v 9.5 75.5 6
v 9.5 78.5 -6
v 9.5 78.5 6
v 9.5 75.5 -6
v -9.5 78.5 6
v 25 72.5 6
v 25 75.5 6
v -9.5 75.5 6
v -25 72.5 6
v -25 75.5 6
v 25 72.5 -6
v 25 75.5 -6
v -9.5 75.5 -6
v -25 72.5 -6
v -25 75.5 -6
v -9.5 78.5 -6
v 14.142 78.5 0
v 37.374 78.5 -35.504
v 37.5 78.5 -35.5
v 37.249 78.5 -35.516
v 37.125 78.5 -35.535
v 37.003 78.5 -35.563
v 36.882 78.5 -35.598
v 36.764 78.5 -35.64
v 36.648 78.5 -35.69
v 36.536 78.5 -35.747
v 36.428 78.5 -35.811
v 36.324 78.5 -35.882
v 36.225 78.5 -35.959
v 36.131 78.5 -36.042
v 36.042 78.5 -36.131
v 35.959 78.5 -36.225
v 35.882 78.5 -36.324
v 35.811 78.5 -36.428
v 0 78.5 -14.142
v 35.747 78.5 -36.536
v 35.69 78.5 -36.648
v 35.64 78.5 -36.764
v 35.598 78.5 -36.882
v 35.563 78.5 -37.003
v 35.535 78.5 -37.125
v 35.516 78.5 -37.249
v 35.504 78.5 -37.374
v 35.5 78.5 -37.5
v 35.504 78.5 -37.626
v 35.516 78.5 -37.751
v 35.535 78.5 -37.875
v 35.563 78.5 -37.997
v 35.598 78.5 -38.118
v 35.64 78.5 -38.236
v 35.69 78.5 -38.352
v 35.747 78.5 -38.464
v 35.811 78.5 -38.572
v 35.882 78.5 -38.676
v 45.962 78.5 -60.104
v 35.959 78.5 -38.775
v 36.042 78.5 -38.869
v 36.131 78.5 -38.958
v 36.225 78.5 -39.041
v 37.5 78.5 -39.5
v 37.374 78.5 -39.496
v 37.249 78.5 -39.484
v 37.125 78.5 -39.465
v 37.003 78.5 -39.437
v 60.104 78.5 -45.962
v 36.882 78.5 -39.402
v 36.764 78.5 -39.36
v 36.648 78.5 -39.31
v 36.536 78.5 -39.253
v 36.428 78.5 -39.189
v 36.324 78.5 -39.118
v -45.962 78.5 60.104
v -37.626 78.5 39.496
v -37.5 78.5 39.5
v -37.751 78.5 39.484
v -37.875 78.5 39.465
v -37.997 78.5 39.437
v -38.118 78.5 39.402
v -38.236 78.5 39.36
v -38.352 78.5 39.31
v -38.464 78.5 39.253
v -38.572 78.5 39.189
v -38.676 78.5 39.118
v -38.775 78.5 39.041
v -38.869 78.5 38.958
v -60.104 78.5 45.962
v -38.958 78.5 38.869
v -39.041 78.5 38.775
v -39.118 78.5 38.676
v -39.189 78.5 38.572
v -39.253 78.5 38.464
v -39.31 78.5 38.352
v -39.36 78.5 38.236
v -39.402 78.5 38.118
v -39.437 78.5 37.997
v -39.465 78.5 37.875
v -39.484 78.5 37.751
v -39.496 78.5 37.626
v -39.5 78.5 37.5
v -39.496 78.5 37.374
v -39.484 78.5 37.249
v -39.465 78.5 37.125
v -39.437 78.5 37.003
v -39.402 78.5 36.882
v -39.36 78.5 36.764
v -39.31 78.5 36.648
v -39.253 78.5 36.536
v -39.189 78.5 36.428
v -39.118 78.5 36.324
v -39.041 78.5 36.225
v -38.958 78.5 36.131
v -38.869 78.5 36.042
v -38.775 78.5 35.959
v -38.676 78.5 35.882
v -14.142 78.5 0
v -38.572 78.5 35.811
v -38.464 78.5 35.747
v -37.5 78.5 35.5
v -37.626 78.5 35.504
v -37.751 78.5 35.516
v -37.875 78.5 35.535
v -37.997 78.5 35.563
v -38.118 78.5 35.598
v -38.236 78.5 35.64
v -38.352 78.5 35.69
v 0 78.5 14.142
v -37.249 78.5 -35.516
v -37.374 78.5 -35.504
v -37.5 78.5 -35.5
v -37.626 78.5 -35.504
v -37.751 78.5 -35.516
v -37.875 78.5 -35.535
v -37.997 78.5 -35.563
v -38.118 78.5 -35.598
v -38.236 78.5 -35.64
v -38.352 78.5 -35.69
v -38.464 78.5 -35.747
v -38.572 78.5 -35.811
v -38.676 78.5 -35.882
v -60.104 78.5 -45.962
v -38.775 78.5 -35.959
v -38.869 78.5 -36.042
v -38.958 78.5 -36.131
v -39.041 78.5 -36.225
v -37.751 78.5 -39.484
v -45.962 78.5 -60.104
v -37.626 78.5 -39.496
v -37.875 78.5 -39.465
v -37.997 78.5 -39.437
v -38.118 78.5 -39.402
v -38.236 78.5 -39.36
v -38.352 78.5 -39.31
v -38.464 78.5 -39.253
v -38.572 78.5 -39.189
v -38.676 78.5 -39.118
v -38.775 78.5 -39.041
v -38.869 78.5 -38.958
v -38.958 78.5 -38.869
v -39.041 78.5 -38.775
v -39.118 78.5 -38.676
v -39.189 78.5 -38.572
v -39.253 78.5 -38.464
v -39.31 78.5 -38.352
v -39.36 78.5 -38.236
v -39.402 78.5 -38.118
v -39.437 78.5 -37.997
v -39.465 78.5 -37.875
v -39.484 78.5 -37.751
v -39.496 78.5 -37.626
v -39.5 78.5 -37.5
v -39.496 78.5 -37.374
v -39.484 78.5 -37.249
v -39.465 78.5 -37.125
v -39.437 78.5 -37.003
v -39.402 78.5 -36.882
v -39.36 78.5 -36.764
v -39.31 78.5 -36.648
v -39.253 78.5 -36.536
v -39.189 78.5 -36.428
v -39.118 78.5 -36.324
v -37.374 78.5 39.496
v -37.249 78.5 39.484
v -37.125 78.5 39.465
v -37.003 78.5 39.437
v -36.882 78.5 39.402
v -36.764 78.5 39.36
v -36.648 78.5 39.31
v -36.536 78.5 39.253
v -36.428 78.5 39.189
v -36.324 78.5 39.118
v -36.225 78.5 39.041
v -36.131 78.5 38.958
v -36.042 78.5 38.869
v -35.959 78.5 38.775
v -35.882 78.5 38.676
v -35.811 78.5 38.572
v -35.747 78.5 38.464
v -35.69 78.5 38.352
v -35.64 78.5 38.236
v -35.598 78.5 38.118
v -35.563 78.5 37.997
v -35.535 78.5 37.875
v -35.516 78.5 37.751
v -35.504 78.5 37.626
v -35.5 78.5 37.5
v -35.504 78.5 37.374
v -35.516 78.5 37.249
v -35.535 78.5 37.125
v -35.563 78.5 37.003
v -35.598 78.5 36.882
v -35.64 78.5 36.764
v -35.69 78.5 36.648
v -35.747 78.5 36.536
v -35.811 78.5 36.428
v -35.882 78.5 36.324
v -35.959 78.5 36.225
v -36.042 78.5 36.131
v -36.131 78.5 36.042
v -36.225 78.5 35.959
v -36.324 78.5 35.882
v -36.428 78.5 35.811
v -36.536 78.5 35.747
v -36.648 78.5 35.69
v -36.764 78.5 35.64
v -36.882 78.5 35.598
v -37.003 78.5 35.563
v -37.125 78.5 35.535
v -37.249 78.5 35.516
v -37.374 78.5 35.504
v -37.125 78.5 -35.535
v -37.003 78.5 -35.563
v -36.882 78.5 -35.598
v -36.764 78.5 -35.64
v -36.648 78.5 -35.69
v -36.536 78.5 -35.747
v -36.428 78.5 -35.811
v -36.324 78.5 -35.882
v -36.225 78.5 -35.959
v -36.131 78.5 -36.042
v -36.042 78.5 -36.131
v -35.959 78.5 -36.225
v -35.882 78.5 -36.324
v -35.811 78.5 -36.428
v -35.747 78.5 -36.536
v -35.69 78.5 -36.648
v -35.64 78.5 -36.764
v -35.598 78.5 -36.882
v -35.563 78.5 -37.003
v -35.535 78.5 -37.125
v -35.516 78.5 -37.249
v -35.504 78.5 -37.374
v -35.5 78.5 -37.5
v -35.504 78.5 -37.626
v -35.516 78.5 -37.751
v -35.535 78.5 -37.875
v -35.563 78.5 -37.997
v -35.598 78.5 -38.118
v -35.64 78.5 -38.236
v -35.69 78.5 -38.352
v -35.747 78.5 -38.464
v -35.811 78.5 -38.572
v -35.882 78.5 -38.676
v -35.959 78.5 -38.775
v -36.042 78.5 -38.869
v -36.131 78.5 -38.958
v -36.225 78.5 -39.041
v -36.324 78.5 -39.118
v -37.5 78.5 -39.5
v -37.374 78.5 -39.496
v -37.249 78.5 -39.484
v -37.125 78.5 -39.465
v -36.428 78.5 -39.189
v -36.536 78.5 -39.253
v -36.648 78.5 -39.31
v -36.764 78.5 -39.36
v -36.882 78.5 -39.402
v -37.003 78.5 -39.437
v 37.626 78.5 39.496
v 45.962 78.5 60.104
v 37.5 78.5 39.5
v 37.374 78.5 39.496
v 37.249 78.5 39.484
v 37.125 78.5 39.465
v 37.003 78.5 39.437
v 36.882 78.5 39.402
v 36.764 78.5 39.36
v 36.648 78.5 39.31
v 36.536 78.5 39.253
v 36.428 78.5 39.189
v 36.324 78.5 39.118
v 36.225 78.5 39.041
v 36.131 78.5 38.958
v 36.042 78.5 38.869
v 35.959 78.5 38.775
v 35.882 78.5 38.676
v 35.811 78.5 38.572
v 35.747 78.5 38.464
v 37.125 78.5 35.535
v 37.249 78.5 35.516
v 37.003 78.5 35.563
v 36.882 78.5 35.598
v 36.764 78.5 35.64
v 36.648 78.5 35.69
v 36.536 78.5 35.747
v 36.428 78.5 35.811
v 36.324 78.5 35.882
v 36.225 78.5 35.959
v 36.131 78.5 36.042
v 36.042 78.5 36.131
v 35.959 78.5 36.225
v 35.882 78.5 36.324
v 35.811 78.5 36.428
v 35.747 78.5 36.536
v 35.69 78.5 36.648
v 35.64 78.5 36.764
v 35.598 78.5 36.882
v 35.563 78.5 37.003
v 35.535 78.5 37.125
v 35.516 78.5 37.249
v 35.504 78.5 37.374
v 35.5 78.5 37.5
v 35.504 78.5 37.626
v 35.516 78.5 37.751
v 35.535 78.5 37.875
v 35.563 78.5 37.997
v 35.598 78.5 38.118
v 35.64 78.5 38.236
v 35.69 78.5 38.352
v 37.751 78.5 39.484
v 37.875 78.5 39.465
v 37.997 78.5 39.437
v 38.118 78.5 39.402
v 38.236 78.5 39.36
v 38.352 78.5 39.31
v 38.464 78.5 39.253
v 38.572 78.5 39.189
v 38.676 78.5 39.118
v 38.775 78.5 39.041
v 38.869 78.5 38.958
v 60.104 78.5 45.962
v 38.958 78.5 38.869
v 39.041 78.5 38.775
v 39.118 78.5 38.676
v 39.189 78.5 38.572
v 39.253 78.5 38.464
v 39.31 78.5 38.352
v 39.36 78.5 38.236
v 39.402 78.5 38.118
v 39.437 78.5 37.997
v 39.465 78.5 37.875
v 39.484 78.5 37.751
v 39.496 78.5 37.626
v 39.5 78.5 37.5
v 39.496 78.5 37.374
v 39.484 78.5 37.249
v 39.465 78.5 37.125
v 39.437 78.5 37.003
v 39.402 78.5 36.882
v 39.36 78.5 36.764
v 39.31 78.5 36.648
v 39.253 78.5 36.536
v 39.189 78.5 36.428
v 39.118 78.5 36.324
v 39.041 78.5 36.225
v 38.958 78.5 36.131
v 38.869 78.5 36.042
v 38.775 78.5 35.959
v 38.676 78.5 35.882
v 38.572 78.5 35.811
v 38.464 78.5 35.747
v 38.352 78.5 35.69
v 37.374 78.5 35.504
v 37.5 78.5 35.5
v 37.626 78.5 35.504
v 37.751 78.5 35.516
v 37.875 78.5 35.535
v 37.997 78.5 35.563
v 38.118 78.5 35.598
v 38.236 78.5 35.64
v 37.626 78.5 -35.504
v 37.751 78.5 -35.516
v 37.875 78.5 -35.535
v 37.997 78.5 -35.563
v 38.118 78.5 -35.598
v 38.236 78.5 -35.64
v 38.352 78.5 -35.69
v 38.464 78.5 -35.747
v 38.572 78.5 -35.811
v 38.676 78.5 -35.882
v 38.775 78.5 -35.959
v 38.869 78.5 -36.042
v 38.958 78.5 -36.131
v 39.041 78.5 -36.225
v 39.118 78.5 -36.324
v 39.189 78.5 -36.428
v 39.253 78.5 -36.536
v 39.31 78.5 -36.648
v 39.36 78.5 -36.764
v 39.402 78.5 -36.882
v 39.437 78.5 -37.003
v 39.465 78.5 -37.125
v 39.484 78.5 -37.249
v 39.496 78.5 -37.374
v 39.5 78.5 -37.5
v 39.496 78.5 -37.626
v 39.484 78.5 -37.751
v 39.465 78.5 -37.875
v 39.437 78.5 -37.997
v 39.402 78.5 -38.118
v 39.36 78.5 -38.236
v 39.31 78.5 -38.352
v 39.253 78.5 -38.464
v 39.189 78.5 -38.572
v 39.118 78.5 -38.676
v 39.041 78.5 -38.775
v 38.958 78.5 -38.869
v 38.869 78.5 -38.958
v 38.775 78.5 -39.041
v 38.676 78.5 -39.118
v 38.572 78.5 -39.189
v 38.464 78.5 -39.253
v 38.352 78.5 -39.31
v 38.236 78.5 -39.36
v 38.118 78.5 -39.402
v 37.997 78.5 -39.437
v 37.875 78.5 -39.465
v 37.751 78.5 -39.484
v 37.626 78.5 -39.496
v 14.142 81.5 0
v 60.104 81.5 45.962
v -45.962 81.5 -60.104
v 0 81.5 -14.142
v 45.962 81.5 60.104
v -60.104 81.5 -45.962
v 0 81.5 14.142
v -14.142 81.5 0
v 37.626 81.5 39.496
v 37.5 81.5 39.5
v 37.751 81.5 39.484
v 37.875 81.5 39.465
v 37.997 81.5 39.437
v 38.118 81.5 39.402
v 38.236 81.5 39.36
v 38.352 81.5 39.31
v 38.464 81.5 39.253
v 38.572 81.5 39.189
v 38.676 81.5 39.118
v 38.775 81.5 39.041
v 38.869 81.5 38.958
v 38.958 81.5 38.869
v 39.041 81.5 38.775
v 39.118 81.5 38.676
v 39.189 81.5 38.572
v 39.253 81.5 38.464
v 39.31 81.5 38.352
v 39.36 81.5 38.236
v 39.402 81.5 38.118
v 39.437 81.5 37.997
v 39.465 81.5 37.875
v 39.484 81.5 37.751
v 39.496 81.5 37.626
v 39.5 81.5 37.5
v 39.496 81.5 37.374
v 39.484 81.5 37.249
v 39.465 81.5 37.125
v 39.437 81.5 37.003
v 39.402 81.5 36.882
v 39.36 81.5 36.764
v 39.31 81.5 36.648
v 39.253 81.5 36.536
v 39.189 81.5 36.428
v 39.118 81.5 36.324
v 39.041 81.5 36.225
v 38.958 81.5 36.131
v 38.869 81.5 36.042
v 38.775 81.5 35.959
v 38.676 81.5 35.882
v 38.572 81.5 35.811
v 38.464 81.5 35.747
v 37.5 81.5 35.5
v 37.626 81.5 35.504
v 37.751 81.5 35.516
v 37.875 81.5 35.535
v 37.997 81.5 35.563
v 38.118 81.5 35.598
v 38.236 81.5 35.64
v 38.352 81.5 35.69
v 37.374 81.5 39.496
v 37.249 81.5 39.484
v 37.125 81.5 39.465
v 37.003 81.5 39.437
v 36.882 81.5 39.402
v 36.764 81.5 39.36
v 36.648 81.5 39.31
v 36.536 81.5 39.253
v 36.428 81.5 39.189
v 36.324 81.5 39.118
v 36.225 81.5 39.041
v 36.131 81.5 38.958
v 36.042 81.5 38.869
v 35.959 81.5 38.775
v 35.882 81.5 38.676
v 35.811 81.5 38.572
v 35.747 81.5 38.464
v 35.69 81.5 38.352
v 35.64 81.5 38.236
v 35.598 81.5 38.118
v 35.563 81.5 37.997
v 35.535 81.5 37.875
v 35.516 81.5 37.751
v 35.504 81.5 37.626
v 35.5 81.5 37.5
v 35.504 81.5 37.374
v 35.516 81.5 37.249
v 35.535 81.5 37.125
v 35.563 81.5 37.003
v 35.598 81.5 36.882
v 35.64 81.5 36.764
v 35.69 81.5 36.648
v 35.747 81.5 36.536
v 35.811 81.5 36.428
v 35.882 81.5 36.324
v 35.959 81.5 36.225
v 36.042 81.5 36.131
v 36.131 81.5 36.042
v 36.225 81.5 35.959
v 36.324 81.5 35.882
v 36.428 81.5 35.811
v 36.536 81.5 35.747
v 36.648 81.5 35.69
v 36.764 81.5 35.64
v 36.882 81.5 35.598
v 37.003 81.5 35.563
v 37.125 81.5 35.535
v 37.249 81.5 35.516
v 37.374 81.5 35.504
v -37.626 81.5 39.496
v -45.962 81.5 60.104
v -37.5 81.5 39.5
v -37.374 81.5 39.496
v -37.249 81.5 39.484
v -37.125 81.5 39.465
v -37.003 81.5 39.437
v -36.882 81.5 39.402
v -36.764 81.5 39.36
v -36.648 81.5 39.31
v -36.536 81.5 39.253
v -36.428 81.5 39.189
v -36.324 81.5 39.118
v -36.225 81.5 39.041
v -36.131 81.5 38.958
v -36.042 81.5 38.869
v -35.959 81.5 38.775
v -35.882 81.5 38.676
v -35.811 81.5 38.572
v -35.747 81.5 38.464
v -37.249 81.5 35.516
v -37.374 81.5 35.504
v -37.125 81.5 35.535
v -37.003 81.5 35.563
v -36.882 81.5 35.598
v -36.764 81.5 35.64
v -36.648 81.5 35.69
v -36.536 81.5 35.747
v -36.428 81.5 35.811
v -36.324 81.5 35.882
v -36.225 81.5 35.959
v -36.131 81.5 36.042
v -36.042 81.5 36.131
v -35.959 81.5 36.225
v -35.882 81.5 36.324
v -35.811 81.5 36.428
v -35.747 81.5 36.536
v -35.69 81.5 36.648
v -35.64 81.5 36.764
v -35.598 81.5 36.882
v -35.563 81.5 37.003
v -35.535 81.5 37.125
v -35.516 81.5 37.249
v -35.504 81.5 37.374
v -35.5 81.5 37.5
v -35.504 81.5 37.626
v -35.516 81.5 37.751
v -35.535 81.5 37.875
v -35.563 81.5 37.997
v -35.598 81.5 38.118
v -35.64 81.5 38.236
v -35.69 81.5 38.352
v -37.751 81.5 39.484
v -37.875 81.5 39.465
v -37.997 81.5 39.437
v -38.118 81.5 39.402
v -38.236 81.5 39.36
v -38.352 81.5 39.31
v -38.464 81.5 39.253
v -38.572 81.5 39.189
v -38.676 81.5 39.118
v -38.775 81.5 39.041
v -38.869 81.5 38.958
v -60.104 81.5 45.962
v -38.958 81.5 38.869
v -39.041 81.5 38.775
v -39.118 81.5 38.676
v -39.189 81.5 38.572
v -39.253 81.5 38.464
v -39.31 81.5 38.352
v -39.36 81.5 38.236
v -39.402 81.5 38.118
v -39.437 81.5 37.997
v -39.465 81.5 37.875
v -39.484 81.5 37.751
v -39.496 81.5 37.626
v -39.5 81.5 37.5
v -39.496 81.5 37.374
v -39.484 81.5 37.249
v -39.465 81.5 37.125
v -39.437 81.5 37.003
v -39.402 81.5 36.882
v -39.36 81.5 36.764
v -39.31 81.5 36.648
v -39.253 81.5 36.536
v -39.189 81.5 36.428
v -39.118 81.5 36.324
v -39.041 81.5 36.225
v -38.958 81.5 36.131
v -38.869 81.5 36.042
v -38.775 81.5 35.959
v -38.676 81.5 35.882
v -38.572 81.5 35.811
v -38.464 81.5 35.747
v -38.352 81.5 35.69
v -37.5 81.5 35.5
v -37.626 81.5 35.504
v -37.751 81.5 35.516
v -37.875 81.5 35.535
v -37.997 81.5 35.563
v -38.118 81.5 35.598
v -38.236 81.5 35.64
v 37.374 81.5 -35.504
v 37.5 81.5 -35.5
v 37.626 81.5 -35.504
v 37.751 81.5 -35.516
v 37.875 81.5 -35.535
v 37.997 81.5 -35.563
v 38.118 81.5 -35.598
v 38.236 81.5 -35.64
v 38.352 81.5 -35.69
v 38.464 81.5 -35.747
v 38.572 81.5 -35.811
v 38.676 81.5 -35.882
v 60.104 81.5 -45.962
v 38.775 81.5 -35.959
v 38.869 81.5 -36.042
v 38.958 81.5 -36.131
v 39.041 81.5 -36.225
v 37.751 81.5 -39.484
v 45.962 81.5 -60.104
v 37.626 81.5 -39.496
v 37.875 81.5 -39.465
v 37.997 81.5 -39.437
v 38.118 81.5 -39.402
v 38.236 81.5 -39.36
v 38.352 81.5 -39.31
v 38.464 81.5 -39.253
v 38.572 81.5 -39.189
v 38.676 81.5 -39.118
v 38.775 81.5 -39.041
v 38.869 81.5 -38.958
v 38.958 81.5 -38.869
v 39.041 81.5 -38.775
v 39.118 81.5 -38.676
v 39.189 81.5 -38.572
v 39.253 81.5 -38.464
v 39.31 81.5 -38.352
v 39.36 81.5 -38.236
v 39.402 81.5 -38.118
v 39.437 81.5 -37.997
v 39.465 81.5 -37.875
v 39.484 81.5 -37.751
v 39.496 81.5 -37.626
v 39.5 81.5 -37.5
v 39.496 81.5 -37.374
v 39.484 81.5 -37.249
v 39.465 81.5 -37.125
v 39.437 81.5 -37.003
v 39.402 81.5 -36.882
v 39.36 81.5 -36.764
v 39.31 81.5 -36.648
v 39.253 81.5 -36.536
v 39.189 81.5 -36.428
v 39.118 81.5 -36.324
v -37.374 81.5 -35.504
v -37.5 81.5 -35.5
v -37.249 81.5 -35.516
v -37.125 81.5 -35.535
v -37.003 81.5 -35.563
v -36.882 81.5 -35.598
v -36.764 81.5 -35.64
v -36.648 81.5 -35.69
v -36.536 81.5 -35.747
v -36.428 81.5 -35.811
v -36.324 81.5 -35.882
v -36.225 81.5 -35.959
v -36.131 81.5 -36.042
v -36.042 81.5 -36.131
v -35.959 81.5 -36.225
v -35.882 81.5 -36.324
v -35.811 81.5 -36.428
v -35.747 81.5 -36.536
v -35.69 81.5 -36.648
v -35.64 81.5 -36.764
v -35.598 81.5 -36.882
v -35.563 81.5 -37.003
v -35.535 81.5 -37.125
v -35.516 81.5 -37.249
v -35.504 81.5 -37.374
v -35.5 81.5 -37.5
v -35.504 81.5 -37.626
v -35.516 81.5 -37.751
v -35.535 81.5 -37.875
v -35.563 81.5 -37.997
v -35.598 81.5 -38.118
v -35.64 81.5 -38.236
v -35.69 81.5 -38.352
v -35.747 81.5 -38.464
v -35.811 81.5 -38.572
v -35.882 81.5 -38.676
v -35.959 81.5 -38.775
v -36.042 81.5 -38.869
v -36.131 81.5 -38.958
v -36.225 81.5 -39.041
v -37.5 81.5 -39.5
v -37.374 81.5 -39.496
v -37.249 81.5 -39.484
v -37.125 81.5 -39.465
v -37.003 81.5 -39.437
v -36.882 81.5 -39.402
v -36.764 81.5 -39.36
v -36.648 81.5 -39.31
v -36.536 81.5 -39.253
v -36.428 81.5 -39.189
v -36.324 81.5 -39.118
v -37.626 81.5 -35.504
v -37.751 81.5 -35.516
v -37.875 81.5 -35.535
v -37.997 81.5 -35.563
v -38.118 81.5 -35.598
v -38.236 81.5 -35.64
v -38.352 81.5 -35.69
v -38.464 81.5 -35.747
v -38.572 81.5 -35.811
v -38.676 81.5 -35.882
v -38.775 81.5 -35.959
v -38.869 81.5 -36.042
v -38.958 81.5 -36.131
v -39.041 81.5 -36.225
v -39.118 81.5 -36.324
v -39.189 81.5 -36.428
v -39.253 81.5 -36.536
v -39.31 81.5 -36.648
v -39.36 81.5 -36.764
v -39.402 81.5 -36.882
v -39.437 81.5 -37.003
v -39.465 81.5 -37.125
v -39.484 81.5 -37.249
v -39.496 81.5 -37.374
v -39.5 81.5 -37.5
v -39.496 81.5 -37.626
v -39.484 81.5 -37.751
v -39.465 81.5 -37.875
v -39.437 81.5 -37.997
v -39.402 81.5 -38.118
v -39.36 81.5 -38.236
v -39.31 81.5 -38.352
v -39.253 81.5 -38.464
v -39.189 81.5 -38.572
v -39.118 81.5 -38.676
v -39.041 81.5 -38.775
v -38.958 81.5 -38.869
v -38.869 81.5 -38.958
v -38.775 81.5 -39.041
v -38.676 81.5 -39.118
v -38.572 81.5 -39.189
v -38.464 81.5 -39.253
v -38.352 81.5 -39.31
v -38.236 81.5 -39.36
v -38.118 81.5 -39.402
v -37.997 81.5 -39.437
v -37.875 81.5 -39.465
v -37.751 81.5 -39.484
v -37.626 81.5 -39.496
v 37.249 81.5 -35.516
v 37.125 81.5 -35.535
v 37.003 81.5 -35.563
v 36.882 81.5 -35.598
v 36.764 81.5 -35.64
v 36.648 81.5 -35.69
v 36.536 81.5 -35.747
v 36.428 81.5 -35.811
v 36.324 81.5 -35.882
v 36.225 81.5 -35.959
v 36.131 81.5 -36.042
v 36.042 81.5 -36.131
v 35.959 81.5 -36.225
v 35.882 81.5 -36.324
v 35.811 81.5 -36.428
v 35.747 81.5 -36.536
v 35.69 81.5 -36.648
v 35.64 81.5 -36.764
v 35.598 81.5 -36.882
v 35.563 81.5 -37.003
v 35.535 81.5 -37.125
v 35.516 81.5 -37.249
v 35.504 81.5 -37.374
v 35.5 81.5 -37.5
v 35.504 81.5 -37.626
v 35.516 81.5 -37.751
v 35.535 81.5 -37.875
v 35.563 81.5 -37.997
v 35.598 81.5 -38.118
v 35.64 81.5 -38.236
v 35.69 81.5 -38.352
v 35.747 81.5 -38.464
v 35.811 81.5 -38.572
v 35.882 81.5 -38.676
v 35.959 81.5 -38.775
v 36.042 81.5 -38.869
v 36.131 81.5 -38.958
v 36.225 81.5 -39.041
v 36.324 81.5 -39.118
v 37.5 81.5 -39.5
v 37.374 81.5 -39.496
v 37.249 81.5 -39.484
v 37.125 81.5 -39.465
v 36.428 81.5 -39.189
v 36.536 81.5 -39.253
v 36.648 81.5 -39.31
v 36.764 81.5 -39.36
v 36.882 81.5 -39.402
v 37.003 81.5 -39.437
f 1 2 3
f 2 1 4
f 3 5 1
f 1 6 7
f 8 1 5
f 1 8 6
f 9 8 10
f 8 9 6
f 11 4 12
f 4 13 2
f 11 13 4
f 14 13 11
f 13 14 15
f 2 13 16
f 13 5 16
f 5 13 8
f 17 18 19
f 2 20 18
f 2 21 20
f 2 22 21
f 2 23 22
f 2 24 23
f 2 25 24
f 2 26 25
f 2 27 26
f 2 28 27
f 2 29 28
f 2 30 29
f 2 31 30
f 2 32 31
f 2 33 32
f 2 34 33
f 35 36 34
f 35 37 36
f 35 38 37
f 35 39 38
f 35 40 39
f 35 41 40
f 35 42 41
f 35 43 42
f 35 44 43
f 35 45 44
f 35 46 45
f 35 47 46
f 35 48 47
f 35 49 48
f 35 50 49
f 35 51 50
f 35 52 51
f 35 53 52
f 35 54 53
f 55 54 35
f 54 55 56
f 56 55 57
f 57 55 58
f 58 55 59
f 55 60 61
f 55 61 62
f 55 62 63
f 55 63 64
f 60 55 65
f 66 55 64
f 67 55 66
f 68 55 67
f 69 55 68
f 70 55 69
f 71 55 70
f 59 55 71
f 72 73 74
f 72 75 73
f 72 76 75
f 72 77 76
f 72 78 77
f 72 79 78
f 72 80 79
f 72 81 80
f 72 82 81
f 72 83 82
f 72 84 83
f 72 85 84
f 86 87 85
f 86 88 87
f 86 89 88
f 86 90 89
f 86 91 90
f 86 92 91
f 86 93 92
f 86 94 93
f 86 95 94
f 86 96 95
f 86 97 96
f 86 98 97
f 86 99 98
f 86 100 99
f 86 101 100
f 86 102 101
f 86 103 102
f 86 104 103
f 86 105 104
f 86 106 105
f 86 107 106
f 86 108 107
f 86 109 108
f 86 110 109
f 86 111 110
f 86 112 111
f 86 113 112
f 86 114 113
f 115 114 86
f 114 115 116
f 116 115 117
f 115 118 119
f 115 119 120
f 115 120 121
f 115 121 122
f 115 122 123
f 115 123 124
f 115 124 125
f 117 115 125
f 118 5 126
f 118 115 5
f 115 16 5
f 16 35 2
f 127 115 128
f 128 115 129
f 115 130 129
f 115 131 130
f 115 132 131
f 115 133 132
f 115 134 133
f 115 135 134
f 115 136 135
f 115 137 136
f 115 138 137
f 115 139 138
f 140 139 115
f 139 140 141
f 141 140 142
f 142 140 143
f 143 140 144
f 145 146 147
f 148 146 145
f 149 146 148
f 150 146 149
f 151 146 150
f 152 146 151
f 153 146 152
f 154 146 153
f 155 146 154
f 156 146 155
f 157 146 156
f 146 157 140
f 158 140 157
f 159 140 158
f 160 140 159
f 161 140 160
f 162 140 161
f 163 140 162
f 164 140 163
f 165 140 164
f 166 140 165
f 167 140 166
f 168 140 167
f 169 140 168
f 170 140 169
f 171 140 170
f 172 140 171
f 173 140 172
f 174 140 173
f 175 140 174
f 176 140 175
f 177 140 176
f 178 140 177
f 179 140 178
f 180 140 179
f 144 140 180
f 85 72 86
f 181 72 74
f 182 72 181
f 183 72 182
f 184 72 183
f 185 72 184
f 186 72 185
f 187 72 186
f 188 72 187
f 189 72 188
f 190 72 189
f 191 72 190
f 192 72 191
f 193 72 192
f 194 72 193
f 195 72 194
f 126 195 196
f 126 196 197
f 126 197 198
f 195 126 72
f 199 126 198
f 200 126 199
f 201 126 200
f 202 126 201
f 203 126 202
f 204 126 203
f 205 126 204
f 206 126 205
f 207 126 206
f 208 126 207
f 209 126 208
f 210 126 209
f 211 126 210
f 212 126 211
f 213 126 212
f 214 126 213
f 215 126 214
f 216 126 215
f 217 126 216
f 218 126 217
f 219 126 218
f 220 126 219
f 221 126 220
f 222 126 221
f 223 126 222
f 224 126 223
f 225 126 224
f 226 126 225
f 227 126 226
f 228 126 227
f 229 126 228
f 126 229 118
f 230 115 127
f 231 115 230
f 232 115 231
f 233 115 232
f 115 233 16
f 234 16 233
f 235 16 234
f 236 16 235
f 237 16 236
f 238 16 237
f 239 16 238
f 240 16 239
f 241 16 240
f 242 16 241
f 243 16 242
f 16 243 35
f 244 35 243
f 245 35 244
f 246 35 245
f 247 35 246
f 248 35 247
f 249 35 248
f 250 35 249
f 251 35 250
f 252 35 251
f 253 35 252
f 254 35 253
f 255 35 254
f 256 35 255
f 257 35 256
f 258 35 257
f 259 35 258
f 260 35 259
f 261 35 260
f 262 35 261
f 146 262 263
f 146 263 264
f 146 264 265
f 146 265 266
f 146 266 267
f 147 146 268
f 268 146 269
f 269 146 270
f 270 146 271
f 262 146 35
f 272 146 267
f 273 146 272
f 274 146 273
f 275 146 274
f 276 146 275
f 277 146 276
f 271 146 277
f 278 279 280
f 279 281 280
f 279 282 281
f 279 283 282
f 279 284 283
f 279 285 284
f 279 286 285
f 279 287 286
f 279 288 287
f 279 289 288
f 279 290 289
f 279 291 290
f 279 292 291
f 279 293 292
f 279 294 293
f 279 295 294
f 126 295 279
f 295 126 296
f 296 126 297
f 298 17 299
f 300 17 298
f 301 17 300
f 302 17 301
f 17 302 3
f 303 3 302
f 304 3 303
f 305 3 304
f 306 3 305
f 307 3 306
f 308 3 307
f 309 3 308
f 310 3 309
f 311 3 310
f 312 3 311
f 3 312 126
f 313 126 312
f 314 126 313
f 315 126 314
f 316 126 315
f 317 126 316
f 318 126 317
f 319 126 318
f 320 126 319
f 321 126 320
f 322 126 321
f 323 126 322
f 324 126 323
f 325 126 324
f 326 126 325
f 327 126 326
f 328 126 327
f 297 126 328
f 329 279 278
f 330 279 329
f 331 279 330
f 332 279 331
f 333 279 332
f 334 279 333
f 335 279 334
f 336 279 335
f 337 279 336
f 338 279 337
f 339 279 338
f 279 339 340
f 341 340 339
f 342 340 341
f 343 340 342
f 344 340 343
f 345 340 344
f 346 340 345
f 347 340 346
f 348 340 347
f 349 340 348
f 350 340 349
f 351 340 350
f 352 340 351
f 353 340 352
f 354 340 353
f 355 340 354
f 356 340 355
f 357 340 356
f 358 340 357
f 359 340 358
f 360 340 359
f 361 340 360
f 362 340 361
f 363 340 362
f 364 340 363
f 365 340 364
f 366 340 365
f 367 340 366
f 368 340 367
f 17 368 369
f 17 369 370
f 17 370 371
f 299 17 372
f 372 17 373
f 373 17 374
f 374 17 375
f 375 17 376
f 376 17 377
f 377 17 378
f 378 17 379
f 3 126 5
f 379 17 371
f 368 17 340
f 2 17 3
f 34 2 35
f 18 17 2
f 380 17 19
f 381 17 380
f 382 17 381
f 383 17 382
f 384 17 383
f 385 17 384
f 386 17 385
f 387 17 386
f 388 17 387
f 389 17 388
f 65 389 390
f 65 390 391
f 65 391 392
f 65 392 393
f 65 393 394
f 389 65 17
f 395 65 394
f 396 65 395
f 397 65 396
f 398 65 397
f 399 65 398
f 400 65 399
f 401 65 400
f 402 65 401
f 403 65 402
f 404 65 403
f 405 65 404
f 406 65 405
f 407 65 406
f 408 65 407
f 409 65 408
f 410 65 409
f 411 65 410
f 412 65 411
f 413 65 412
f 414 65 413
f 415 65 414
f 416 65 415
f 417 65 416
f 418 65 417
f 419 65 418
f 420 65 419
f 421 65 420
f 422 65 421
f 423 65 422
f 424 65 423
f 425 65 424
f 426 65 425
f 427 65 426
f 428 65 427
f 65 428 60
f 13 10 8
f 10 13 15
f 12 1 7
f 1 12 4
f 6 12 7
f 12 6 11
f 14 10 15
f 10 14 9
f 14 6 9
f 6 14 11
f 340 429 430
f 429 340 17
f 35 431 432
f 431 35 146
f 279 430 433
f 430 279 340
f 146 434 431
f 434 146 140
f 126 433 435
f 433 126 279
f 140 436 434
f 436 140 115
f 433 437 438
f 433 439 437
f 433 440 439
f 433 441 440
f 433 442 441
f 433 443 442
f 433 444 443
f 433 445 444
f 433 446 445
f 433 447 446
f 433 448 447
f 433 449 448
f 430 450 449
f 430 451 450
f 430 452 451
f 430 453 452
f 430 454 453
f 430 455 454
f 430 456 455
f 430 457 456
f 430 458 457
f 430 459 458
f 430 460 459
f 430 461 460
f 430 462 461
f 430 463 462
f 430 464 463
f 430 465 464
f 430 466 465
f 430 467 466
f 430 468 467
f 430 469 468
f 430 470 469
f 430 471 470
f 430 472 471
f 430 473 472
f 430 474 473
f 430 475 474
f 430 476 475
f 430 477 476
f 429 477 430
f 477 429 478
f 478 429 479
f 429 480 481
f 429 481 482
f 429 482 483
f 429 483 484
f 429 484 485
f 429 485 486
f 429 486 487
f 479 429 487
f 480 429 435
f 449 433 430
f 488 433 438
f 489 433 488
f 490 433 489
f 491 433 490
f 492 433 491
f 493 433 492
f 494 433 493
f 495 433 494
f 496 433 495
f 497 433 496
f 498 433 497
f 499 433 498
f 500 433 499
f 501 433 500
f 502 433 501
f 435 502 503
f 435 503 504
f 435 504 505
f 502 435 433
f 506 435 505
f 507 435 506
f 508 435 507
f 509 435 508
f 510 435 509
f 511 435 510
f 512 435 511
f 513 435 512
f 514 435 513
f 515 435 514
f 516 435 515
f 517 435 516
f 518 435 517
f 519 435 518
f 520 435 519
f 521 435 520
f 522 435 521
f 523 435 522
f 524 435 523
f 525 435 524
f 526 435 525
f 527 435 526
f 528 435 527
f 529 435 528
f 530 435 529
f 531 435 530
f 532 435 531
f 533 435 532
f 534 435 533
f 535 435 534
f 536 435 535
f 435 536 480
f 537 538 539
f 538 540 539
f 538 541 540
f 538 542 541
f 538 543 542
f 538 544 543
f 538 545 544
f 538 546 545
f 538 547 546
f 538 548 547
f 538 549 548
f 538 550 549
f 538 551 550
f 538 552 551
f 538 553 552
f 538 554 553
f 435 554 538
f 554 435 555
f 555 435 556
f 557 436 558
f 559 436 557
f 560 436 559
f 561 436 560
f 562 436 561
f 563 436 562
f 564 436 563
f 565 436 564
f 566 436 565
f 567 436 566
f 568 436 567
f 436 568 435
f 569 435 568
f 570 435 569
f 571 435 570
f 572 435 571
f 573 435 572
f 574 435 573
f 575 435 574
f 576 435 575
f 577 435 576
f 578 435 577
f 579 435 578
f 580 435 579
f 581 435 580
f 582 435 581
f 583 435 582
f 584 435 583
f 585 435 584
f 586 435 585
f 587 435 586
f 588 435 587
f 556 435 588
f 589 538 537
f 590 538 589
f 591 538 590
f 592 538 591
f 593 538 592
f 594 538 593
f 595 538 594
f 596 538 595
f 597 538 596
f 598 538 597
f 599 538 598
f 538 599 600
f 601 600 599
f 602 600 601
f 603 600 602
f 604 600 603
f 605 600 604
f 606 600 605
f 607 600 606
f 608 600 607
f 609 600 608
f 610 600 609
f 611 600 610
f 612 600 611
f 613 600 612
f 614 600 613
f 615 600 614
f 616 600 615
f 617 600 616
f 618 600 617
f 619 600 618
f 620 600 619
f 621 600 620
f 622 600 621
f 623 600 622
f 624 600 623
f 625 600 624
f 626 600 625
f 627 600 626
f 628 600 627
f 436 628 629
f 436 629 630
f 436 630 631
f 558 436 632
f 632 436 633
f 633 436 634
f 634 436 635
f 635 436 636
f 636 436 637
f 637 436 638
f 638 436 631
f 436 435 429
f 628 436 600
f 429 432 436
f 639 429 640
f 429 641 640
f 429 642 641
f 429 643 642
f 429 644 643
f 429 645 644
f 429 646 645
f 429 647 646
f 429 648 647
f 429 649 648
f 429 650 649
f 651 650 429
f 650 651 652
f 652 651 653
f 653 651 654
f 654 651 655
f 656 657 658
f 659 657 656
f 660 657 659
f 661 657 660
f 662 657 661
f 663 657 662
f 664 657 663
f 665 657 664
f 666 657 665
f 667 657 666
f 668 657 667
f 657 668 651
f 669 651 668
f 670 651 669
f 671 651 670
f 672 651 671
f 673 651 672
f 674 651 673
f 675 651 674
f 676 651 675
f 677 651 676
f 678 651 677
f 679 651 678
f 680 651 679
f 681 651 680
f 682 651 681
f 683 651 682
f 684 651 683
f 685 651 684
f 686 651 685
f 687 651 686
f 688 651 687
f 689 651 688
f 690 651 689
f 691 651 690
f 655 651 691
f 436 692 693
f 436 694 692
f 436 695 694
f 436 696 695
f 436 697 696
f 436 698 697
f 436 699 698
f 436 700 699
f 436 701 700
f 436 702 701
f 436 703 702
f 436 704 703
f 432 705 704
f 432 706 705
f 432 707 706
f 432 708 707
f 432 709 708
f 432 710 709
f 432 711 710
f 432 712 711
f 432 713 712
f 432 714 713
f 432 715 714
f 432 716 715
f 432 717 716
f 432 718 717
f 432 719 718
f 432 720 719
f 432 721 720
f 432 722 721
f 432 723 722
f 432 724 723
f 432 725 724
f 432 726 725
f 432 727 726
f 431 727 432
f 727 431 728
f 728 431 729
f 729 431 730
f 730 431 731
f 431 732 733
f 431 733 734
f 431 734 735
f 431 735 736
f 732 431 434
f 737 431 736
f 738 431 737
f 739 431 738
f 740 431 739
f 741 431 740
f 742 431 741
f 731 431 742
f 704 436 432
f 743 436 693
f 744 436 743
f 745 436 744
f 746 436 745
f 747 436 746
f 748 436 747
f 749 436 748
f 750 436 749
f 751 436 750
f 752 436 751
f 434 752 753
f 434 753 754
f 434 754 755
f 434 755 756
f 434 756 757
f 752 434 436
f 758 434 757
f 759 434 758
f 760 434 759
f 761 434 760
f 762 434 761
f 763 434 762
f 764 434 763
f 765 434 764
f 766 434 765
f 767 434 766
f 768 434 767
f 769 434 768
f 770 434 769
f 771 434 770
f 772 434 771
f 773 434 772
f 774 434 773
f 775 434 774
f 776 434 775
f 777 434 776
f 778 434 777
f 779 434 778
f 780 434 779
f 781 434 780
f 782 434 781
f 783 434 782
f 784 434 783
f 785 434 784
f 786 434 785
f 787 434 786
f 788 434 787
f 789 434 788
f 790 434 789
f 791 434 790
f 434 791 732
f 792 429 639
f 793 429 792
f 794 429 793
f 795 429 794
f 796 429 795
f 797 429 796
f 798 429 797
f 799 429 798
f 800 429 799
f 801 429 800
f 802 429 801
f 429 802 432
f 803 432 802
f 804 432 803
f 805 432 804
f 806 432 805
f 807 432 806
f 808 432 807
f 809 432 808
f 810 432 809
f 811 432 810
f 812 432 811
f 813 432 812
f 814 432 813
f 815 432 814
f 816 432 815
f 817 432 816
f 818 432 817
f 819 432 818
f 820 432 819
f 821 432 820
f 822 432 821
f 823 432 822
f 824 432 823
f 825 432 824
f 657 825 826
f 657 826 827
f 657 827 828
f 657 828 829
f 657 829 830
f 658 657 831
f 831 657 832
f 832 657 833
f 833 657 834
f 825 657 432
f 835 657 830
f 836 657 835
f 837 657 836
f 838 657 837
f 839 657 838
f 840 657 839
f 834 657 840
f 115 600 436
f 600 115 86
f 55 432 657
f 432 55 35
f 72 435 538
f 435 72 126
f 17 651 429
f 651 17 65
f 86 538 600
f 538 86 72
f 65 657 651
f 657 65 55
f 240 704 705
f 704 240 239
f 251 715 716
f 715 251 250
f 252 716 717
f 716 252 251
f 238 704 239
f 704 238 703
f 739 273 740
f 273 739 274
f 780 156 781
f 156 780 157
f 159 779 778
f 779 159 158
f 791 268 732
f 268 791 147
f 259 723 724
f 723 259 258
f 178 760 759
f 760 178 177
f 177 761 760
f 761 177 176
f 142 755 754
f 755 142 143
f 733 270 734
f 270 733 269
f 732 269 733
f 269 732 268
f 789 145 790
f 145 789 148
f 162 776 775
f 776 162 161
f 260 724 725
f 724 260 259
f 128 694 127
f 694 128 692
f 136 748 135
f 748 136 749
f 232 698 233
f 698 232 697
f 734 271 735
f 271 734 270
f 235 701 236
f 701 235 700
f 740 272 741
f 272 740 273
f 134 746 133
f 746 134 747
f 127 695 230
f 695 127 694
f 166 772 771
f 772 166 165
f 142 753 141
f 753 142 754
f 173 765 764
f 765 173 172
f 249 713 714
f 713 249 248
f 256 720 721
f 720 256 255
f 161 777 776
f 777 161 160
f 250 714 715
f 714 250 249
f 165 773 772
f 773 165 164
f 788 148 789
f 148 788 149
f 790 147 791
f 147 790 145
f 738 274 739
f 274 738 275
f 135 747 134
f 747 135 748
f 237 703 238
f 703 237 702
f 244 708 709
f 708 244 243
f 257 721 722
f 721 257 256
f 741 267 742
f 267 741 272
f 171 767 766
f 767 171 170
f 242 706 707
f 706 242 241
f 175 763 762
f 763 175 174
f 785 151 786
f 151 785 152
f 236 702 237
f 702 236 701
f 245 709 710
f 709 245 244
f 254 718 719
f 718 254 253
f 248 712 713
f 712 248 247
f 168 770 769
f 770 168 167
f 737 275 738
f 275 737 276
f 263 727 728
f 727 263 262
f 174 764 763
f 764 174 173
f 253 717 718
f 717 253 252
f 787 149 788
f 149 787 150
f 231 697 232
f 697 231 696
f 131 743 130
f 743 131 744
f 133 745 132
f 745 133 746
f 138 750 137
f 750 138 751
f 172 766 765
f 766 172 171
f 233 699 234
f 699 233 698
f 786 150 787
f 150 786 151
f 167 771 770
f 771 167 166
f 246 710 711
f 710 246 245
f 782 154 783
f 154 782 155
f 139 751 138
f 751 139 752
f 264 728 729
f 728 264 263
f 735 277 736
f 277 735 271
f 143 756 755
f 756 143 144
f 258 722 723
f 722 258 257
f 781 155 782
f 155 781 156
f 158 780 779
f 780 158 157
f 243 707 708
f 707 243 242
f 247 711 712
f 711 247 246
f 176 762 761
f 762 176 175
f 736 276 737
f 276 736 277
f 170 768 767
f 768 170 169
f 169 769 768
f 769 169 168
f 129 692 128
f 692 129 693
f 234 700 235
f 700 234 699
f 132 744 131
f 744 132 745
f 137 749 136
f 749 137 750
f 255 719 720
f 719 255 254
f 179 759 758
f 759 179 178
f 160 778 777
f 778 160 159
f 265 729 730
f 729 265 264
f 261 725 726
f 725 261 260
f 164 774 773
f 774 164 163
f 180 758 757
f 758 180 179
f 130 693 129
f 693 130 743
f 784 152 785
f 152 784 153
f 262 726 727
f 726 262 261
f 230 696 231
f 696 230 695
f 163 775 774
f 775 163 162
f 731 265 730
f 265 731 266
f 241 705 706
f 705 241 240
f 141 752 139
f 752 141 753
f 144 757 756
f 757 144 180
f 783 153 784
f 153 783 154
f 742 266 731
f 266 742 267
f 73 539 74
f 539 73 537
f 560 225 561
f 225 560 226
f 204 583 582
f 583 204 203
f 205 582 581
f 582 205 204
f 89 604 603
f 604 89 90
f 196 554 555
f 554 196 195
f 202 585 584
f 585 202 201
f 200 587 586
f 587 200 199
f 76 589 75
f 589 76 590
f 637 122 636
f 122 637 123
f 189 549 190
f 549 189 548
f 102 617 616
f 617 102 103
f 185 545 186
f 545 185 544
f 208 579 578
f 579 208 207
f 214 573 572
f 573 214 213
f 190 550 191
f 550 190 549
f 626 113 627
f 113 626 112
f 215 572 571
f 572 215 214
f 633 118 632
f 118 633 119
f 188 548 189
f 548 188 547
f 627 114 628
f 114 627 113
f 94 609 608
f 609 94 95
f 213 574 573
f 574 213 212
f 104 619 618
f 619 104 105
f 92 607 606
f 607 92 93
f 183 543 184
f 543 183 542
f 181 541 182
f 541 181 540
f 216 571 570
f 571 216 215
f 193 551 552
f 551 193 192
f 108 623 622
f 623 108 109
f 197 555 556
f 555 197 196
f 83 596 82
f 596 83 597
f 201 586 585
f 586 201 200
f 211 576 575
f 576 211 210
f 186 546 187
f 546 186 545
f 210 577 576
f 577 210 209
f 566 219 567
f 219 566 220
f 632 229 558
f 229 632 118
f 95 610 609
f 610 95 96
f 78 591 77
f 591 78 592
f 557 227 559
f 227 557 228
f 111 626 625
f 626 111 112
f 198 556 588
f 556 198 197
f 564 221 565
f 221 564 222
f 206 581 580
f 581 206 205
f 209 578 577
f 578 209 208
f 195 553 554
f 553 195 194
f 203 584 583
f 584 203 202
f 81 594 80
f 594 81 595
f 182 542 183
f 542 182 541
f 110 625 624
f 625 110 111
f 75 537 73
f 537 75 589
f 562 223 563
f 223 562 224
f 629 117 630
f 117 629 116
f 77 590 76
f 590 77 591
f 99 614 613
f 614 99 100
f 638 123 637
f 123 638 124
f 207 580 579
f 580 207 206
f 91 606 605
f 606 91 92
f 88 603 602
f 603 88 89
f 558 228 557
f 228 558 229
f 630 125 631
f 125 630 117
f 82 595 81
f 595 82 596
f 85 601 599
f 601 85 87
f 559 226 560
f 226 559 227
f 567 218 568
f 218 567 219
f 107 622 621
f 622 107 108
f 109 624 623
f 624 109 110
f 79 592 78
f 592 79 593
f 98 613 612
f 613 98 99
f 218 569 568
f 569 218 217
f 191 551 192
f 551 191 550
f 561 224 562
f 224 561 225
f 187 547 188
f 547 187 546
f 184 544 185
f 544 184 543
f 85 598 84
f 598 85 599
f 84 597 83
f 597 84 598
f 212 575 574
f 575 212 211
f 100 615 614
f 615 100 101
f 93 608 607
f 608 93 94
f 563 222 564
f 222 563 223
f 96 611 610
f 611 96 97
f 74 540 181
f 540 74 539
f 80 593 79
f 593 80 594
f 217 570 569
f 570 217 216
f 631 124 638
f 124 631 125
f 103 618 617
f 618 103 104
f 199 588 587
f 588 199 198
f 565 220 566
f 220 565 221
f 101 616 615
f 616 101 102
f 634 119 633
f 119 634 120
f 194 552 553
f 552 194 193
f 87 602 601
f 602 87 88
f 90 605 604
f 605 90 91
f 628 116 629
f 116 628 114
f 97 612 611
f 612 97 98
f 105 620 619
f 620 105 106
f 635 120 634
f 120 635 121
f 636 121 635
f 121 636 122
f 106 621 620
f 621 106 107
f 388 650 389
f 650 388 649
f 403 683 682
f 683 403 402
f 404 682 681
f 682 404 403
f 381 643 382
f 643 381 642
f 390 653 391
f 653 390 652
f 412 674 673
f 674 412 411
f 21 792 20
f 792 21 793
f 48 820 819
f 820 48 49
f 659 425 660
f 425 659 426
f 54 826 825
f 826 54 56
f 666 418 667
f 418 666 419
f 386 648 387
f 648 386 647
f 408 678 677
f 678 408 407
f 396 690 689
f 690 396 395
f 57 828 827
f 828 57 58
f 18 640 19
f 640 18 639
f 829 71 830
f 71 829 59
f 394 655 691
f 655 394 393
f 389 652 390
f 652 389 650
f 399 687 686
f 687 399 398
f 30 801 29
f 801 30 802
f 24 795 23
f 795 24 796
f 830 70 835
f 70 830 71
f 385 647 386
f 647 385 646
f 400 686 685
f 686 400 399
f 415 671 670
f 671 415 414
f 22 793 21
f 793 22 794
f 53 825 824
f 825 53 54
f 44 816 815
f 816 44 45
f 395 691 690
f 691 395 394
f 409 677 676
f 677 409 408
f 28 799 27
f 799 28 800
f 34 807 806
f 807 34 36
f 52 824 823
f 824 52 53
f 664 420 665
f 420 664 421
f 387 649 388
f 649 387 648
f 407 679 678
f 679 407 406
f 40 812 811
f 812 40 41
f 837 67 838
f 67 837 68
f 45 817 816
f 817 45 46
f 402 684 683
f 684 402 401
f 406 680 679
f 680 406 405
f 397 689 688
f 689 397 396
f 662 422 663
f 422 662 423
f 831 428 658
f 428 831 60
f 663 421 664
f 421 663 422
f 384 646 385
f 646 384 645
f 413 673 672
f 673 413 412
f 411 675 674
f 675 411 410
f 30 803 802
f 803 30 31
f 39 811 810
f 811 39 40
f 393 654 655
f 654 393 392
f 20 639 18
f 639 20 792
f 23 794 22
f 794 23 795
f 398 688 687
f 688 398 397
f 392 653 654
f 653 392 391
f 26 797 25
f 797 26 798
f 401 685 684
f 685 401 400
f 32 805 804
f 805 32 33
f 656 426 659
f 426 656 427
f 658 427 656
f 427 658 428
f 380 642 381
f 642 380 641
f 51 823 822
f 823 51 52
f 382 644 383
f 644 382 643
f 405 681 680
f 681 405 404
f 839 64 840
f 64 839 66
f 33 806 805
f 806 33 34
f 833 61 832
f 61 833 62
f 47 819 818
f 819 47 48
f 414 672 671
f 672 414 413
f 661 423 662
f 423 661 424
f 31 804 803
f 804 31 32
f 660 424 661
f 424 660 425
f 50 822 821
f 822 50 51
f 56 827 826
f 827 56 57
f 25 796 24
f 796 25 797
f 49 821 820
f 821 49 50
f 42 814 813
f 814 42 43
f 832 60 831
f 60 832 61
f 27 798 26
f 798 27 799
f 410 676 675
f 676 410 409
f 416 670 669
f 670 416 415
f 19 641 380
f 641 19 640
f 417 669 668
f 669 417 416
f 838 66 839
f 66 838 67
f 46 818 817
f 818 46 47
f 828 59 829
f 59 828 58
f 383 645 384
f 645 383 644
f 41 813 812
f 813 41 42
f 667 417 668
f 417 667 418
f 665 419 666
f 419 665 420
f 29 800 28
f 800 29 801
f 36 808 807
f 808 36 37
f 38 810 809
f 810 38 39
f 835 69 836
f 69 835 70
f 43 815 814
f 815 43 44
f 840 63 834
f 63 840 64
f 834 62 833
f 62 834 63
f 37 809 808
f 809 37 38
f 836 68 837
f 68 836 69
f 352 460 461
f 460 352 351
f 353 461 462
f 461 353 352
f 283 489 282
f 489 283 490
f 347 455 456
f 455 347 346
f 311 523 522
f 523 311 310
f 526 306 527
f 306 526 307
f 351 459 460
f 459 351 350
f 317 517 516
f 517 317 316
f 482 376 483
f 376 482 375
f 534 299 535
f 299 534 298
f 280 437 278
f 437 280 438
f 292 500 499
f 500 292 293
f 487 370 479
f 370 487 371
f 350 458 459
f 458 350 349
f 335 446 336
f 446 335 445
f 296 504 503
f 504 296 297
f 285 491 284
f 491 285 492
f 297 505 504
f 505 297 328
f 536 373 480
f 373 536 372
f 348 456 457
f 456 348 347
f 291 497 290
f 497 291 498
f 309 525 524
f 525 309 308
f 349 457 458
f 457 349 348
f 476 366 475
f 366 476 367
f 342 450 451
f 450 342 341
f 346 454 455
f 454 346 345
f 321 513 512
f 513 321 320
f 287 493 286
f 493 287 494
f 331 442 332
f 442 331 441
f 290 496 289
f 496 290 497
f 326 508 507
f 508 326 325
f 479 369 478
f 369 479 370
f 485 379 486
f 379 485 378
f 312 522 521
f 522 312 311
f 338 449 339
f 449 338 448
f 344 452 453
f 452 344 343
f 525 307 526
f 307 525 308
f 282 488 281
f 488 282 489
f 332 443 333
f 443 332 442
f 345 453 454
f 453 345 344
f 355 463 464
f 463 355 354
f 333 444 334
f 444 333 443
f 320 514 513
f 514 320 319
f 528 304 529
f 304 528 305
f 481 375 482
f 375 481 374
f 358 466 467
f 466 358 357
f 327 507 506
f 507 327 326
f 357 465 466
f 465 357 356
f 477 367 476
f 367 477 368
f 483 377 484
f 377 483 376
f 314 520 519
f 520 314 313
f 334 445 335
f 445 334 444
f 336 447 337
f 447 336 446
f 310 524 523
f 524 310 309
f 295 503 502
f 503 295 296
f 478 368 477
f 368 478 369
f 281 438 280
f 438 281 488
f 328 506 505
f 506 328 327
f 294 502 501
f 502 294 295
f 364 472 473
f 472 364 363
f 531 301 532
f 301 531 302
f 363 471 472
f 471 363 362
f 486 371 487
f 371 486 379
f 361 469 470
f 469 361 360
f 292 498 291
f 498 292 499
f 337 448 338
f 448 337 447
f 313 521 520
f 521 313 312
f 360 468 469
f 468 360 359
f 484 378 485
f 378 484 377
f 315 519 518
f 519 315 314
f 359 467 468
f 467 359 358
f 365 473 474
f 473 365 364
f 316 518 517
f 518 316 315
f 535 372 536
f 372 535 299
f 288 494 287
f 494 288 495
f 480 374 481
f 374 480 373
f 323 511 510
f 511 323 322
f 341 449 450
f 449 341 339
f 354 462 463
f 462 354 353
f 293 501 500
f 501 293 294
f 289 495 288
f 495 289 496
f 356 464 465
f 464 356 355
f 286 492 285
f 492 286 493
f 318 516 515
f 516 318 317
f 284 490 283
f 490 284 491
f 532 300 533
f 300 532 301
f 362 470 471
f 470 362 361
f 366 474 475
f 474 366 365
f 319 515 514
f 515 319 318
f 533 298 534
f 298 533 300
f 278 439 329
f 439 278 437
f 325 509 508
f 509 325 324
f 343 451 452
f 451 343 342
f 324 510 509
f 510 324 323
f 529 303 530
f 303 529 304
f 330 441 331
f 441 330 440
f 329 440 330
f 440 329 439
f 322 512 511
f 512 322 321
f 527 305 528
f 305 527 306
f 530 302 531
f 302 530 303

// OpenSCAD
$fn=100;

//import("./roundedcube.scad");
M5=5;
M4=4;
M3=3;

module edge(side, height, hole_diameter) {
    difference() {
        cube([side, side, height], center=true); //, 1, "all");

        cylinder(h=height, d=hole_diameter, center=true);
    }
}
module edger(side, height, hole_diameter) {
    
        
    difference() {
        union() {
            cube([side, side, height], center=true); //, 1, "all");
            translate([0,-7.5,0]) cylinder(d=side, h=height, center=true); //, 1, "all");
        }
        translate([0,-7.5,0]) cylinder(h=height, d=hole_diameter, center=true);
    }
}
module base(length, width, height, hole_diameter, hole_sep, edge_side, edge_sep) {
    square_hole_length = (length-height-edge_sep) / 2;
    union() {
        difference() {
            cube([length, width- EDGE_SIDE, height], center=true); //, 1, "all");
            translate([-hole_sep/2,-(width-2*BASE_SIDE-hole_diameter)/2,0]) cylinder(h=height, d=hole_diameter, center=true);
            translate([+hole_sep/2,-(width-2*BASE_SIDE-hole_diameter)/2,0]) cylinder(h=height, d=hole_diameter, center=true);

            
        }
        rotate(a=90, v=[0,1,0]) translate([height, width/2 , -edge_sep/2 - height/2 ]) edge(edge_side, height, M4);
        rotate(a=90, v=[0,1,0]) translate([height, width/2 , edge_sep/2 + height/2]) edge(edge_side, height, M4);
    }
}

module mount() {
    off=75/2;
    difference() {
        union() {
   // cube([59, 3, 15], center=true);
        translate([0,-3,0])        cube([19, 3, 12], center=true);        
    translate([0,-6,0])        cube([50, 3, 12], center=true);
     //rotate(a=90, v=[0,1,0])  translate([0, -6, -27]) edger(15, 5, M5);
     //rotate(a=90, v=[0,1,0])  translate([0, -6, +27]) edger(15, 5, M5);
     rotate(a=45, v=[0,1,0]) cube([20, 3, 150], center=true)   ;
     rotate(a=-45, v=[0,1,0]) cube([20, 3, 150], center=true)   ;
        }
    translate([-off, 5, -off]) rotate(a=90, v=[1,0,0]) cylinder(h=10,d=M4);
    translate([-off, 5, off]) rotate(a=90, v=[1,0,0]) cylinder(h=10,d=M4);
    translate([off, 5, -off]) rotate(a=90, v=[1,0,0]) cylinder(h=10,d=M4);
    translate([off, 5, off]) rotate(a=90, v=[1,0,0]) cylinder(h=10,d=M4);
        //cylinder(h=3,d=3)
    }
//        rotate(a=90, v=[0,1,0]) translate([height, width/2 , edge_sep/2 + height/2]) edge(edge_side, height, M5);
}

module mount2() {
    cube([59, 3, 15], center=true);
      translate([0,4,-6]) cube([59, 9, 3], center=true);

        //cube([20, 3, 18], center=true);
        //cube([20, 3, 18], center=true);
    translate([20,7,1.5]) cube([19, 3, 12], center=true);
    translate([-20,7,1.5]) cube([19, 3, 12], center=true);
    translate([27,4,1.5]) cube([5, 5, 12], center=true);
    translate([-27,4,1.5]) cube([5, 5, 12], center=true);
    
    rotate(a=90, v=[0,1,0])  translate([0, -6, -27]) edger(15, 5, M4);
    rotate(a=90, v=[0,1,0])  translate([0, -6, +27]) edger(15, 5, M4);
}

EDGE_SIDE = 15;
BASE_SIDE = 15;
BASE_HOLE_SEP = 110;

BASE_HOLE_DIAMETER = 15;
BASE_LENGTH = BASE_HOLE_SEP + BASE_HOLE_DIAMETER + 2*BASE_SIDE;
BASE_WIDTH = 27.5+BASE_HOLE_DIAMETER+BASE_SIDE;
BASE_HEIGHT = 5;
BASE_EDGE_SEP = 60;

//base(BASE_LENGTH, BASE_WIDTH, BASE_HEIGHT, BASE_HOLE_DIAMETER, BASE_HOLE_SEP, EDGE_SIDE, BASE_EDGE_SEP);
//translate([0,50,0]) mount2();
translate([0,80,0]) mount();
